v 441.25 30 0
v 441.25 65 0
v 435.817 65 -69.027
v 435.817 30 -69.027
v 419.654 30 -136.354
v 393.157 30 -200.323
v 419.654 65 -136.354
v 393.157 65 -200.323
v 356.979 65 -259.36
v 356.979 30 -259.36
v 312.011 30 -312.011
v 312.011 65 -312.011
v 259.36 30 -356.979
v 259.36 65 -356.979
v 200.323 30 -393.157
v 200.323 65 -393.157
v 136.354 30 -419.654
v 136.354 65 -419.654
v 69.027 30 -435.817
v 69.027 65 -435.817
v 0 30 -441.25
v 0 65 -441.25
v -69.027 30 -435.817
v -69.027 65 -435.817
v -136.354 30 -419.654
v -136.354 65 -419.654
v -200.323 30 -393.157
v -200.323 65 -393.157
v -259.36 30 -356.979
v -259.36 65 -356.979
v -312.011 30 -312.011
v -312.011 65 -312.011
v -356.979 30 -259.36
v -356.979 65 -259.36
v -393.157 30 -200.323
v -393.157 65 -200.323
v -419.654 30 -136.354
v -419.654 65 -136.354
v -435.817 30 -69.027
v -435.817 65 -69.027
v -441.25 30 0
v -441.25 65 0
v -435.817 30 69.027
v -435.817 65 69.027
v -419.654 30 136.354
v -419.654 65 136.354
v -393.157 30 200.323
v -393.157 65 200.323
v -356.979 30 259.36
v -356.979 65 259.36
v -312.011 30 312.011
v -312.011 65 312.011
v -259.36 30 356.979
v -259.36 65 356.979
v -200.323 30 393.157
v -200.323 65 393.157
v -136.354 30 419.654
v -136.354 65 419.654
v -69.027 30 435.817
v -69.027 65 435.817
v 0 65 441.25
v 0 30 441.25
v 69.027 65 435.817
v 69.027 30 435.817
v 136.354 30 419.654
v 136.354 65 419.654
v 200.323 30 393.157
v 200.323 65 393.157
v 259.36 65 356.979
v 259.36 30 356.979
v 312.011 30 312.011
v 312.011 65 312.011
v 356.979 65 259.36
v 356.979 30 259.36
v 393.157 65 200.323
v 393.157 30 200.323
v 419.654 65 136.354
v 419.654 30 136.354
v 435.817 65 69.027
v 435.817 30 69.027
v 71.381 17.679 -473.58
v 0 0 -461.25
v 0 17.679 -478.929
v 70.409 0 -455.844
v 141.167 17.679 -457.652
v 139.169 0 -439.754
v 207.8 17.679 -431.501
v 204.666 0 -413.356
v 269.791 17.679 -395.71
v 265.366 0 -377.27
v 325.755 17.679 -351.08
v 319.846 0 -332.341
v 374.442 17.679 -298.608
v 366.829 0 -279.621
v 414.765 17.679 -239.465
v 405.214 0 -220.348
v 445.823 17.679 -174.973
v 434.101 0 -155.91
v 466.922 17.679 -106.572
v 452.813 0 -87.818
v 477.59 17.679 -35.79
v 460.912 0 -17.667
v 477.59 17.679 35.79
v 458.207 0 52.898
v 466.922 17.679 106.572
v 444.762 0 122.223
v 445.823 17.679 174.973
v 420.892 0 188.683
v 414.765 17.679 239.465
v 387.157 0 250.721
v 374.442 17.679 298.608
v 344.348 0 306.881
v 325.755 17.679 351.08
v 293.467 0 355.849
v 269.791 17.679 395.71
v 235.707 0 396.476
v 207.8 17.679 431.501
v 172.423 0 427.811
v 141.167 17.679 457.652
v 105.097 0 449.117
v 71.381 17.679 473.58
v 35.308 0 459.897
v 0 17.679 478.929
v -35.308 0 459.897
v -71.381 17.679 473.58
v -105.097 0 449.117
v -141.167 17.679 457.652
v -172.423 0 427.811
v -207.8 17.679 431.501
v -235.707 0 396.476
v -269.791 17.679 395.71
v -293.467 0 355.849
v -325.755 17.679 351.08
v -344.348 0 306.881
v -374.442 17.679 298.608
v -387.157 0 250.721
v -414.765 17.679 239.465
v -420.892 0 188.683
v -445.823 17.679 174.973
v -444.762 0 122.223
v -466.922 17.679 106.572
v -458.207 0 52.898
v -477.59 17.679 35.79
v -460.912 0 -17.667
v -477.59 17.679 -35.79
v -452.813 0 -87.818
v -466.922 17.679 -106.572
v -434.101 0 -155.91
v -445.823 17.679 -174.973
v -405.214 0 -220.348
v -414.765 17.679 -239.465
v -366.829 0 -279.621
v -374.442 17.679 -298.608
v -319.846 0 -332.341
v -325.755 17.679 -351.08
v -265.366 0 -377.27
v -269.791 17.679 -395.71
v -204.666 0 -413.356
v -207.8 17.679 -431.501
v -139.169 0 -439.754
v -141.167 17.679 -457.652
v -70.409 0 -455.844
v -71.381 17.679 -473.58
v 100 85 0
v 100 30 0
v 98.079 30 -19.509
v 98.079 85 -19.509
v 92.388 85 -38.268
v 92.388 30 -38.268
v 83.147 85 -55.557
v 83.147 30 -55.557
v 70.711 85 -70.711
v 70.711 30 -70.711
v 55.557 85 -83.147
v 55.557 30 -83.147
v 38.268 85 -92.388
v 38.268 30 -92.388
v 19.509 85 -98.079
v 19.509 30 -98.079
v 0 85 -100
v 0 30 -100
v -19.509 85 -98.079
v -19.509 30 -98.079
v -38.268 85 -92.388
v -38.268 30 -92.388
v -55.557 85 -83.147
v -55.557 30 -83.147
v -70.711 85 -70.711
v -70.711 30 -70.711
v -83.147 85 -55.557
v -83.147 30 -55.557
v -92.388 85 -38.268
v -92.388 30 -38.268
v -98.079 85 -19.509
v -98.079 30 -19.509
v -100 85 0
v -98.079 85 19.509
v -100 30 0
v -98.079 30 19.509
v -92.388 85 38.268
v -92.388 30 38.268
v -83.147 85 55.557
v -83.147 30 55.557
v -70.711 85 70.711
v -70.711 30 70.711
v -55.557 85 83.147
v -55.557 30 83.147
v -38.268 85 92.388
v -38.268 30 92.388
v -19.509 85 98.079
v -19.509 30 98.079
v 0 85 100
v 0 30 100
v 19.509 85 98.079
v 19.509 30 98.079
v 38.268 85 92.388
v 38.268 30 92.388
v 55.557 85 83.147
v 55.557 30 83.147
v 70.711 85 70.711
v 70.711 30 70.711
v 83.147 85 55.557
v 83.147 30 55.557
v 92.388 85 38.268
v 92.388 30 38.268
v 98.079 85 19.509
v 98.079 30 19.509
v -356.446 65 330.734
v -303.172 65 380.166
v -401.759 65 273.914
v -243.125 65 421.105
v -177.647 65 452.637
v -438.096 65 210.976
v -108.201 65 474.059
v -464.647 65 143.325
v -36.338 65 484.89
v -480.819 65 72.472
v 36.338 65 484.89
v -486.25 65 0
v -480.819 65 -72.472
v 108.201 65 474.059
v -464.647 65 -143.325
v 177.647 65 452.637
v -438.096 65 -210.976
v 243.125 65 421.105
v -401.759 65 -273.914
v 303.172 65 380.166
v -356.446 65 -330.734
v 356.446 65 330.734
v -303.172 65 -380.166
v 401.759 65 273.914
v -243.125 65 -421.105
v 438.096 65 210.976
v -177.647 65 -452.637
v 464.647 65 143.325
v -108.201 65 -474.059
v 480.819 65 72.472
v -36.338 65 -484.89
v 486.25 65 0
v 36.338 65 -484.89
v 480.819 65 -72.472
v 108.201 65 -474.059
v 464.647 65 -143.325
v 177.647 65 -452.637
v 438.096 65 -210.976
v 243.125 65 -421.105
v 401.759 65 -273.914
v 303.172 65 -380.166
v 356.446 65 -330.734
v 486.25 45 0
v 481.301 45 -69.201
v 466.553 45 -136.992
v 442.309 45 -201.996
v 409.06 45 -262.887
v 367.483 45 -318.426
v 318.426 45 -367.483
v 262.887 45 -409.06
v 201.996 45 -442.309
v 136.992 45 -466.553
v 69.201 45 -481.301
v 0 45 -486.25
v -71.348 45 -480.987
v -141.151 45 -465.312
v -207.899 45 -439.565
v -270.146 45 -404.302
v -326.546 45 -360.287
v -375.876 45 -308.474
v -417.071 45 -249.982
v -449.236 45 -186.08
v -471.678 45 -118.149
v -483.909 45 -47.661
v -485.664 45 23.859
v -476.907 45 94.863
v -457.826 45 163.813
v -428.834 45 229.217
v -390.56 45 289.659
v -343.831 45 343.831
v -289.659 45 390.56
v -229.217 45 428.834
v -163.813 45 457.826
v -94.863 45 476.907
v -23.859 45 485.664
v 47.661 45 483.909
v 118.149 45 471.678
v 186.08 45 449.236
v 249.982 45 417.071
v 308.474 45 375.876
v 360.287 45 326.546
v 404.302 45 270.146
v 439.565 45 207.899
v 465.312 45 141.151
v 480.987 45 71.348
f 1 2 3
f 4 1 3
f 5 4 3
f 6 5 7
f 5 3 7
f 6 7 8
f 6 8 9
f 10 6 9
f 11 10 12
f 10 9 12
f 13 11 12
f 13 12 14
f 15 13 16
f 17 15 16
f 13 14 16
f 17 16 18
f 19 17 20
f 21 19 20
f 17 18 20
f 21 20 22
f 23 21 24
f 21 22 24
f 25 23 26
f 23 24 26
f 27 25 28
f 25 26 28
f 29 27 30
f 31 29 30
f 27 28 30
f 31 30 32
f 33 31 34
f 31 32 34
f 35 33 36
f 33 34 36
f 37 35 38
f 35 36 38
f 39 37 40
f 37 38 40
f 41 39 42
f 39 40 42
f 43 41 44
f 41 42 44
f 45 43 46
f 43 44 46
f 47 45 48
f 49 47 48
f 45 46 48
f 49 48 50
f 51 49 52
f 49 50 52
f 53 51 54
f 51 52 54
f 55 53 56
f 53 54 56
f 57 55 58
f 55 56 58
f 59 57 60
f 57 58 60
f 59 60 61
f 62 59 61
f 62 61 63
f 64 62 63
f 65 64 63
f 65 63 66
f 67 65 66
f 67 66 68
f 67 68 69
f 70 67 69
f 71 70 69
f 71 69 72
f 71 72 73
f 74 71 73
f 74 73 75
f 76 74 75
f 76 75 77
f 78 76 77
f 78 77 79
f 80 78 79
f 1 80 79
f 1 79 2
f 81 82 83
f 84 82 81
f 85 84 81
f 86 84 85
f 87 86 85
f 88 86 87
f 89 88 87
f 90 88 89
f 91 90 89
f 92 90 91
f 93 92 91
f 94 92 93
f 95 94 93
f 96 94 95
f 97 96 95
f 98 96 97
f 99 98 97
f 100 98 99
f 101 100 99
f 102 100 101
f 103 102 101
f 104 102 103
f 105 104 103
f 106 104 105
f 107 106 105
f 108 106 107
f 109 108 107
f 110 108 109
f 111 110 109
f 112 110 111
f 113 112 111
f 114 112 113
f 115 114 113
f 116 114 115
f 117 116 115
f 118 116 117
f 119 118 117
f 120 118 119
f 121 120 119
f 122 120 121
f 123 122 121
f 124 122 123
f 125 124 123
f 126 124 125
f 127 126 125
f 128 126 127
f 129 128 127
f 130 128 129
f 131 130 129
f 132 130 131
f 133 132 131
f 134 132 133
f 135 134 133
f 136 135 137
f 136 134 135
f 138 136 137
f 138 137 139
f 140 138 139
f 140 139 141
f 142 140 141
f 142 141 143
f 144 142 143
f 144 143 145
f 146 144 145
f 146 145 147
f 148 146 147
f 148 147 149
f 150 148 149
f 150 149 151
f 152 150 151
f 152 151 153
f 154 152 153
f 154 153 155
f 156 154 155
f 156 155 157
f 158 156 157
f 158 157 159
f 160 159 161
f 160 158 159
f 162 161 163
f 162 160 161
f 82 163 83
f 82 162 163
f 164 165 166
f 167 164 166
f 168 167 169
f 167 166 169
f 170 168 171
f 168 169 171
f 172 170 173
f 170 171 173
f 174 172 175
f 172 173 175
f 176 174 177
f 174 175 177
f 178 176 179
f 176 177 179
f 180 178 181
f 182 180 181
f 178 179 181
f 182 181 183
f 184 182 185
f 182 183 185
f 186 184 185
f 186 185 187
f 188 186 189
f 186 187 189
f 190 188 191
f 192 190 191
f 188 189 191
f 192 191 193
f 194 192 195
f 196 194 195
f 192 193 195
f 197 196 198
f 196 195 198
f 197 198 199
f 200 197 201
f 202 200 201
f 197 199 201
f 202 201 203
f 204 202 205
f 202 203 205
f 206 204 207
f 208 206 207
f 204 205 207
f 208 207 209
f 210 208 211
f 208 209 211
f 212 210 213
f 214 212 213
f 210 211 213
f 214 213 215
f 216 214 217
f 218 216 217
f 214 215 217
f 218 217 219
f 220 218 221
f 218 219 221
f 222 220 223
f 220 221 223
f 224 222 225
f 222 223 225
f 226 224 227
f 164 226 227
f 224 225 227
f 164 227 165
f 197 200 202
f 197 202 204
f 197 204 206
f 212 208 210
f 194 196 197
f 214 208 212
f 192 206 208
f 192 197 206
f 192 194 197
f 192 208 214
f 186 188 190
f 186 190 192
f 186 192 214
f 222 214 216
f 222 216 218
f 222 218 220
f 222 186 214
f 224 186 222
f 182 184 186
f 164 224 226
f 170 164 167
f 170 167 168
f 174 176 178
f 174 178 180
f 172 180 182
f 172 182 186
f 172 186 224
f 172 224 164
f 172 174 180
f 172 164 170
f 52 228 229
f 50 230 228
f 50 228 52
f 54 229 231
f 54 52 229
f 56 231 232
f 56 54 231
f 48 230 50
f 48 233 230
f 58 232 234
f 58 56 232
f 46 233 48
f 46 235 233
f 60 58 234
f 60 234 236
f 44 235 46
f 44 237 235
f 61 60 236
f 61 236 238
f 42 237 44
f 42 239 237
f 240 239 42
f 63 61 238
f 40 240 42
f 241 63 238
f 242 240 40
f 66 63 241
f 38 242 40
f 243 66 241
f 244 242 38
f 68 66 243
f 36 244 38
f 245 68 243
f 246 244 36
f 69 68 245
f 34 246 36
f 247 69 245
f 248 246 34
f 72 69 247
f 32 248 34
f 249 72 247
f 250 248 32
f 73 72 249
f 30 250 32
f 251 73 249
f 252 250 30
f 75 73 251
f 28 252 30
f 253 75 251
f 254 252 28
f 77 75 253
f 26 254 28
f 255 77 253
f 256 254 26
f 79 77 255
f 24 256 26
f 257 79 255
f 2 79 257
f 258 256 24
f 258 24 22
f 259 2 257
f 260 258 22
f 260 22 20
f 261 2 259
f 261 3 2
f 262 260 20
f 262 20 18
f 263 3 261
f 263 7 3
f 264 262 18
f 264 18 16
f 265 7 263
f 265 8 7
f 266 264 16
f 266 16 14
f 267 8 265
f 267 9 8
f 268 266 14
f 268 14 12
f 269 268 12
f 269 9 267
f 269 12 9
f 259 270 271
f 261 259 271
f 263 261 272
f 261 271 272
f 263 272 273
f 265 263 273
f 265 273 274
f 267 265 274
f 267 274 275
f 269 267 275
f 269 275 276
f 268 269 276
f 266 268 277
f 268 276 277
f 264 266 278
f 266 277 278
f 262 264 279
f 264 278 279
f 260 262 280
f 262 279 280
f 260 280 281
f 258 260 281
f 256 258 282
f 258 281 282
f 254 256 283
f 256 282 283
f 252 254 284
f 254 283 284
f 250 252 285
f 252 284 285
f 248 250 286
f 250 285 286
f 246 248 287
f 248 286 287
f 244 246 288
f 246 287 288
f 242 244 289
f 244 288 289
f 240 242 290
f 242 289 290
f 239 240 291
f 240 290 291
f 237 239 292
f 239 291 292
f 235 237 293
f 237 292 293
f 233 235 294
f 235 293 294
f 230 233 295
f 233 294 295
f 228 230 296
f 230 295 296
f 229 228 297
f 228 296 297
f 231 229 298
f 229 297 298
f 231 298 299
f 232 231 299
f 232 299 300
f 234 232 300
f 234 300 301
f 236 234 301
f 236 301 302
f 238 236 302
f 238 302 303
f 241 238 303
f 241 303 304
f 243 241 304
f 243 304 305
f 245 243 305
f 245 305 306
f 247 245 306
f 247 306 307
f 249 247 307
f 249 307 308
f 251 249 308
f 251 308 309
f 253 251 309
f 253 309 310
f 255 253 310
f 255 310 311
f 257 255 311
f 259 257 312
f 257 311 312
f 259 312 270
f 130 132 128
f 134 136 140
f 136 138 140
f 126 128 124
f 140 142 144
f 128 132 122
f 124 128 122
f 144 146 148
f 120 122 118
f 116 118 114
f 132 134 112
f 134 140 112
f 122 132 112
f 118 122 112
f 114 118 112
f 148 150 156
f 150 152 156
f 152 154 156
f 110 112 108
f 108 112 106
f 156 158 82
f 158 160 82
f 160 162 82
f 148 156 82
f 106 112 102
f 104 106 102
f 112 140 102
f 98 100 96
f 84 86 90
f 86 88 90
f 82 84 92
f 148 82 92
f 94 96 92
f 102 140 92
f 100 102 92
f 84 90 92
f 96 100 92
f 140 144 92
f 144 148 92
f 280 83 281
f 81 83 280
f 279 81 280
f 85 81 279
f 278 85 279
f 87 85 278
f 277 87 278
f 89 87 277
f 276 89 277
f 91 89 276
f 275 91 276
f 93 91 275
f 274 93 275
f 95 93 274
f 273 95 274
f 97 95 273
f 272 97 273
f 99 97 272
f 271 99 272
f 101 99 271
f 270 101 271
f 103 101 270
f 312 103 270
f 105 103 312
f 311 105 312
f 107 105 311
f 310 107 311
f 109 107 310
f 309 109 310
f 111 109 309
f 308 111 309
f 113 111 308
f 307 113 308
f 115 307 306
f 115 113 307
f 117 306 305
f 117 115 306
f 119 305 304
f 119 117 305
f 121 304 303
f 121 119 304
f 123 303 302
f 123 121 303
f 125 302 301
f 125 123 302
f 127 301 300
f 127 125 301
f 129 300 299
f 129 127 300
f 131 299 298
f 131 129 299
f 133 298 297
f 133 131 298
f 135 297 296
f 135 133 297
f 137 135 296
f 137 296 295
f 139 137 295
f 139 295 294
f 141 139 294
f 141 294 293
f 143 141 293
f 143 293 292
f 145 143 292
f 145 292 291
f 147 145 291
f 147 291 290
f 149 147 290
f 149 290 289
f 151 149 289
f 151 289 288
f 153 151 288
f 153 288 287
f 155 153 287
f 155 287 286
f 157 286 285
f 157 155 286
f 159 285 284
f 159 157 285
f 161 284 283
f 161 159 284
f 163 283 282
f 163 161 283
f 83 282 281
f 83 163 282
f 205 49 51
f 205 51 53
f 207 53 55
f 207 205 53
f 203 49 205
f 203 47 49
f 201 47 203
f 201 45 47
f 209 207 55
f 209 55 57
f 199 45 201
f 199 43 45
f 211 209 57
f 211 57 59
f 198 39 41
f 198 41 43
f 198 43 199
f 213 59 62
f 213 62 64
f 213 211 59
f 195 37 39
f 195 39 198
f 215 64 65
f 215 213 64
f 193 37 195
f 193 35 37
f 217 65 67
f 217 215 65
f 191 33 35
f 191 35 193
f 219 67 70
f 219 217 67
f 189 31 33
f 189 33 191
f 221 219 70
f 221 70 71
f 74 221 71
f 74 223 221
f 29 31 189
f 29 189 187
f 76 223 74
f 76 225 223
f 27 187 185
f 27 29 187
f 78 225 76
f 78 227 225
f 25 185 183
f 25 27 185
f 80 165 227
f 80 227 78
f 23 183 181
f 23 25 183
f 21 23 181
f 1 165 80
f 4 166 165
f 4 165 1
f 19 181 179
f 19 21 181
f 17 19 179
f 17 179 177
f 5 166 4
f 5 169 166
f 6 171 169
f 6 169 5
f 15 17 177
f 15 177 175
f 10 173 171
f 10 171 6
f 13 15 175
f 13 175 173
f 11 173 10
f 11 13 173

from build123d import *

# Parameters (mm, degrees)
SKETCH1_R           = 486.25
BOSS_EXTRUDE1_DEPTH = 65
SKETCH3_R           = 441.25
CUT_EXTRUDE1_DEPTH  = 35
SKETCH6_R           = 100
BOSS_EXTRUDE3_DEPTH = 55


with BuildPart() as part:
    # Sketch1 → Boss-Extrude1 (new body)
    with BuildSketch(Plane(origin=(0, 0, 0), x_dir=(1, 0, 0), z_dir=(0, 1, 0))):
        Circle(SKETCH1_R)
    extrude(amount=BOSS_EXTRUDE1_DEPTH)

    # Sketch3 → Cut-Extrude1 (cut)
    with BuildSketch(Plane(origin=(0, 65, 0), x_dir=(1, 0, 0), z_dir=(0, 1, 0))):
        Circle(SKETCH3_R)
    extrude(amount=-CUT_EXTRUDE1_DEPTH, mode=Mode.SUBTRACT)

    # Sketch5 → Cut-Revolve1 (revolve, cut)
    with BuildSketch(Plane(origin=(0, 0, 0), x_dir=(0, 0, -1), z_dir=(1, 0, 0))):
        Polygon((486.25, 45), (478.929491924, 17.679491924), (461.25, 0), (486.25, 0), align=None)
    revolve(axis=Axis((0, 89.25, 0), (0, -1, 0)), mode=Mode.SUBTRACT)

    # Sketch6 → Boss-Extrude3 (add)
    with BuildSketch(Plane(origin=(0, 30, 0), x_dir=(1, 0, 0), z_dir=(0, 1, 0))):
        Circle(SKETCH6_R)
    extrude(amount=BOSS_EXTRUDE3_DEPTH)


solid = part.part
